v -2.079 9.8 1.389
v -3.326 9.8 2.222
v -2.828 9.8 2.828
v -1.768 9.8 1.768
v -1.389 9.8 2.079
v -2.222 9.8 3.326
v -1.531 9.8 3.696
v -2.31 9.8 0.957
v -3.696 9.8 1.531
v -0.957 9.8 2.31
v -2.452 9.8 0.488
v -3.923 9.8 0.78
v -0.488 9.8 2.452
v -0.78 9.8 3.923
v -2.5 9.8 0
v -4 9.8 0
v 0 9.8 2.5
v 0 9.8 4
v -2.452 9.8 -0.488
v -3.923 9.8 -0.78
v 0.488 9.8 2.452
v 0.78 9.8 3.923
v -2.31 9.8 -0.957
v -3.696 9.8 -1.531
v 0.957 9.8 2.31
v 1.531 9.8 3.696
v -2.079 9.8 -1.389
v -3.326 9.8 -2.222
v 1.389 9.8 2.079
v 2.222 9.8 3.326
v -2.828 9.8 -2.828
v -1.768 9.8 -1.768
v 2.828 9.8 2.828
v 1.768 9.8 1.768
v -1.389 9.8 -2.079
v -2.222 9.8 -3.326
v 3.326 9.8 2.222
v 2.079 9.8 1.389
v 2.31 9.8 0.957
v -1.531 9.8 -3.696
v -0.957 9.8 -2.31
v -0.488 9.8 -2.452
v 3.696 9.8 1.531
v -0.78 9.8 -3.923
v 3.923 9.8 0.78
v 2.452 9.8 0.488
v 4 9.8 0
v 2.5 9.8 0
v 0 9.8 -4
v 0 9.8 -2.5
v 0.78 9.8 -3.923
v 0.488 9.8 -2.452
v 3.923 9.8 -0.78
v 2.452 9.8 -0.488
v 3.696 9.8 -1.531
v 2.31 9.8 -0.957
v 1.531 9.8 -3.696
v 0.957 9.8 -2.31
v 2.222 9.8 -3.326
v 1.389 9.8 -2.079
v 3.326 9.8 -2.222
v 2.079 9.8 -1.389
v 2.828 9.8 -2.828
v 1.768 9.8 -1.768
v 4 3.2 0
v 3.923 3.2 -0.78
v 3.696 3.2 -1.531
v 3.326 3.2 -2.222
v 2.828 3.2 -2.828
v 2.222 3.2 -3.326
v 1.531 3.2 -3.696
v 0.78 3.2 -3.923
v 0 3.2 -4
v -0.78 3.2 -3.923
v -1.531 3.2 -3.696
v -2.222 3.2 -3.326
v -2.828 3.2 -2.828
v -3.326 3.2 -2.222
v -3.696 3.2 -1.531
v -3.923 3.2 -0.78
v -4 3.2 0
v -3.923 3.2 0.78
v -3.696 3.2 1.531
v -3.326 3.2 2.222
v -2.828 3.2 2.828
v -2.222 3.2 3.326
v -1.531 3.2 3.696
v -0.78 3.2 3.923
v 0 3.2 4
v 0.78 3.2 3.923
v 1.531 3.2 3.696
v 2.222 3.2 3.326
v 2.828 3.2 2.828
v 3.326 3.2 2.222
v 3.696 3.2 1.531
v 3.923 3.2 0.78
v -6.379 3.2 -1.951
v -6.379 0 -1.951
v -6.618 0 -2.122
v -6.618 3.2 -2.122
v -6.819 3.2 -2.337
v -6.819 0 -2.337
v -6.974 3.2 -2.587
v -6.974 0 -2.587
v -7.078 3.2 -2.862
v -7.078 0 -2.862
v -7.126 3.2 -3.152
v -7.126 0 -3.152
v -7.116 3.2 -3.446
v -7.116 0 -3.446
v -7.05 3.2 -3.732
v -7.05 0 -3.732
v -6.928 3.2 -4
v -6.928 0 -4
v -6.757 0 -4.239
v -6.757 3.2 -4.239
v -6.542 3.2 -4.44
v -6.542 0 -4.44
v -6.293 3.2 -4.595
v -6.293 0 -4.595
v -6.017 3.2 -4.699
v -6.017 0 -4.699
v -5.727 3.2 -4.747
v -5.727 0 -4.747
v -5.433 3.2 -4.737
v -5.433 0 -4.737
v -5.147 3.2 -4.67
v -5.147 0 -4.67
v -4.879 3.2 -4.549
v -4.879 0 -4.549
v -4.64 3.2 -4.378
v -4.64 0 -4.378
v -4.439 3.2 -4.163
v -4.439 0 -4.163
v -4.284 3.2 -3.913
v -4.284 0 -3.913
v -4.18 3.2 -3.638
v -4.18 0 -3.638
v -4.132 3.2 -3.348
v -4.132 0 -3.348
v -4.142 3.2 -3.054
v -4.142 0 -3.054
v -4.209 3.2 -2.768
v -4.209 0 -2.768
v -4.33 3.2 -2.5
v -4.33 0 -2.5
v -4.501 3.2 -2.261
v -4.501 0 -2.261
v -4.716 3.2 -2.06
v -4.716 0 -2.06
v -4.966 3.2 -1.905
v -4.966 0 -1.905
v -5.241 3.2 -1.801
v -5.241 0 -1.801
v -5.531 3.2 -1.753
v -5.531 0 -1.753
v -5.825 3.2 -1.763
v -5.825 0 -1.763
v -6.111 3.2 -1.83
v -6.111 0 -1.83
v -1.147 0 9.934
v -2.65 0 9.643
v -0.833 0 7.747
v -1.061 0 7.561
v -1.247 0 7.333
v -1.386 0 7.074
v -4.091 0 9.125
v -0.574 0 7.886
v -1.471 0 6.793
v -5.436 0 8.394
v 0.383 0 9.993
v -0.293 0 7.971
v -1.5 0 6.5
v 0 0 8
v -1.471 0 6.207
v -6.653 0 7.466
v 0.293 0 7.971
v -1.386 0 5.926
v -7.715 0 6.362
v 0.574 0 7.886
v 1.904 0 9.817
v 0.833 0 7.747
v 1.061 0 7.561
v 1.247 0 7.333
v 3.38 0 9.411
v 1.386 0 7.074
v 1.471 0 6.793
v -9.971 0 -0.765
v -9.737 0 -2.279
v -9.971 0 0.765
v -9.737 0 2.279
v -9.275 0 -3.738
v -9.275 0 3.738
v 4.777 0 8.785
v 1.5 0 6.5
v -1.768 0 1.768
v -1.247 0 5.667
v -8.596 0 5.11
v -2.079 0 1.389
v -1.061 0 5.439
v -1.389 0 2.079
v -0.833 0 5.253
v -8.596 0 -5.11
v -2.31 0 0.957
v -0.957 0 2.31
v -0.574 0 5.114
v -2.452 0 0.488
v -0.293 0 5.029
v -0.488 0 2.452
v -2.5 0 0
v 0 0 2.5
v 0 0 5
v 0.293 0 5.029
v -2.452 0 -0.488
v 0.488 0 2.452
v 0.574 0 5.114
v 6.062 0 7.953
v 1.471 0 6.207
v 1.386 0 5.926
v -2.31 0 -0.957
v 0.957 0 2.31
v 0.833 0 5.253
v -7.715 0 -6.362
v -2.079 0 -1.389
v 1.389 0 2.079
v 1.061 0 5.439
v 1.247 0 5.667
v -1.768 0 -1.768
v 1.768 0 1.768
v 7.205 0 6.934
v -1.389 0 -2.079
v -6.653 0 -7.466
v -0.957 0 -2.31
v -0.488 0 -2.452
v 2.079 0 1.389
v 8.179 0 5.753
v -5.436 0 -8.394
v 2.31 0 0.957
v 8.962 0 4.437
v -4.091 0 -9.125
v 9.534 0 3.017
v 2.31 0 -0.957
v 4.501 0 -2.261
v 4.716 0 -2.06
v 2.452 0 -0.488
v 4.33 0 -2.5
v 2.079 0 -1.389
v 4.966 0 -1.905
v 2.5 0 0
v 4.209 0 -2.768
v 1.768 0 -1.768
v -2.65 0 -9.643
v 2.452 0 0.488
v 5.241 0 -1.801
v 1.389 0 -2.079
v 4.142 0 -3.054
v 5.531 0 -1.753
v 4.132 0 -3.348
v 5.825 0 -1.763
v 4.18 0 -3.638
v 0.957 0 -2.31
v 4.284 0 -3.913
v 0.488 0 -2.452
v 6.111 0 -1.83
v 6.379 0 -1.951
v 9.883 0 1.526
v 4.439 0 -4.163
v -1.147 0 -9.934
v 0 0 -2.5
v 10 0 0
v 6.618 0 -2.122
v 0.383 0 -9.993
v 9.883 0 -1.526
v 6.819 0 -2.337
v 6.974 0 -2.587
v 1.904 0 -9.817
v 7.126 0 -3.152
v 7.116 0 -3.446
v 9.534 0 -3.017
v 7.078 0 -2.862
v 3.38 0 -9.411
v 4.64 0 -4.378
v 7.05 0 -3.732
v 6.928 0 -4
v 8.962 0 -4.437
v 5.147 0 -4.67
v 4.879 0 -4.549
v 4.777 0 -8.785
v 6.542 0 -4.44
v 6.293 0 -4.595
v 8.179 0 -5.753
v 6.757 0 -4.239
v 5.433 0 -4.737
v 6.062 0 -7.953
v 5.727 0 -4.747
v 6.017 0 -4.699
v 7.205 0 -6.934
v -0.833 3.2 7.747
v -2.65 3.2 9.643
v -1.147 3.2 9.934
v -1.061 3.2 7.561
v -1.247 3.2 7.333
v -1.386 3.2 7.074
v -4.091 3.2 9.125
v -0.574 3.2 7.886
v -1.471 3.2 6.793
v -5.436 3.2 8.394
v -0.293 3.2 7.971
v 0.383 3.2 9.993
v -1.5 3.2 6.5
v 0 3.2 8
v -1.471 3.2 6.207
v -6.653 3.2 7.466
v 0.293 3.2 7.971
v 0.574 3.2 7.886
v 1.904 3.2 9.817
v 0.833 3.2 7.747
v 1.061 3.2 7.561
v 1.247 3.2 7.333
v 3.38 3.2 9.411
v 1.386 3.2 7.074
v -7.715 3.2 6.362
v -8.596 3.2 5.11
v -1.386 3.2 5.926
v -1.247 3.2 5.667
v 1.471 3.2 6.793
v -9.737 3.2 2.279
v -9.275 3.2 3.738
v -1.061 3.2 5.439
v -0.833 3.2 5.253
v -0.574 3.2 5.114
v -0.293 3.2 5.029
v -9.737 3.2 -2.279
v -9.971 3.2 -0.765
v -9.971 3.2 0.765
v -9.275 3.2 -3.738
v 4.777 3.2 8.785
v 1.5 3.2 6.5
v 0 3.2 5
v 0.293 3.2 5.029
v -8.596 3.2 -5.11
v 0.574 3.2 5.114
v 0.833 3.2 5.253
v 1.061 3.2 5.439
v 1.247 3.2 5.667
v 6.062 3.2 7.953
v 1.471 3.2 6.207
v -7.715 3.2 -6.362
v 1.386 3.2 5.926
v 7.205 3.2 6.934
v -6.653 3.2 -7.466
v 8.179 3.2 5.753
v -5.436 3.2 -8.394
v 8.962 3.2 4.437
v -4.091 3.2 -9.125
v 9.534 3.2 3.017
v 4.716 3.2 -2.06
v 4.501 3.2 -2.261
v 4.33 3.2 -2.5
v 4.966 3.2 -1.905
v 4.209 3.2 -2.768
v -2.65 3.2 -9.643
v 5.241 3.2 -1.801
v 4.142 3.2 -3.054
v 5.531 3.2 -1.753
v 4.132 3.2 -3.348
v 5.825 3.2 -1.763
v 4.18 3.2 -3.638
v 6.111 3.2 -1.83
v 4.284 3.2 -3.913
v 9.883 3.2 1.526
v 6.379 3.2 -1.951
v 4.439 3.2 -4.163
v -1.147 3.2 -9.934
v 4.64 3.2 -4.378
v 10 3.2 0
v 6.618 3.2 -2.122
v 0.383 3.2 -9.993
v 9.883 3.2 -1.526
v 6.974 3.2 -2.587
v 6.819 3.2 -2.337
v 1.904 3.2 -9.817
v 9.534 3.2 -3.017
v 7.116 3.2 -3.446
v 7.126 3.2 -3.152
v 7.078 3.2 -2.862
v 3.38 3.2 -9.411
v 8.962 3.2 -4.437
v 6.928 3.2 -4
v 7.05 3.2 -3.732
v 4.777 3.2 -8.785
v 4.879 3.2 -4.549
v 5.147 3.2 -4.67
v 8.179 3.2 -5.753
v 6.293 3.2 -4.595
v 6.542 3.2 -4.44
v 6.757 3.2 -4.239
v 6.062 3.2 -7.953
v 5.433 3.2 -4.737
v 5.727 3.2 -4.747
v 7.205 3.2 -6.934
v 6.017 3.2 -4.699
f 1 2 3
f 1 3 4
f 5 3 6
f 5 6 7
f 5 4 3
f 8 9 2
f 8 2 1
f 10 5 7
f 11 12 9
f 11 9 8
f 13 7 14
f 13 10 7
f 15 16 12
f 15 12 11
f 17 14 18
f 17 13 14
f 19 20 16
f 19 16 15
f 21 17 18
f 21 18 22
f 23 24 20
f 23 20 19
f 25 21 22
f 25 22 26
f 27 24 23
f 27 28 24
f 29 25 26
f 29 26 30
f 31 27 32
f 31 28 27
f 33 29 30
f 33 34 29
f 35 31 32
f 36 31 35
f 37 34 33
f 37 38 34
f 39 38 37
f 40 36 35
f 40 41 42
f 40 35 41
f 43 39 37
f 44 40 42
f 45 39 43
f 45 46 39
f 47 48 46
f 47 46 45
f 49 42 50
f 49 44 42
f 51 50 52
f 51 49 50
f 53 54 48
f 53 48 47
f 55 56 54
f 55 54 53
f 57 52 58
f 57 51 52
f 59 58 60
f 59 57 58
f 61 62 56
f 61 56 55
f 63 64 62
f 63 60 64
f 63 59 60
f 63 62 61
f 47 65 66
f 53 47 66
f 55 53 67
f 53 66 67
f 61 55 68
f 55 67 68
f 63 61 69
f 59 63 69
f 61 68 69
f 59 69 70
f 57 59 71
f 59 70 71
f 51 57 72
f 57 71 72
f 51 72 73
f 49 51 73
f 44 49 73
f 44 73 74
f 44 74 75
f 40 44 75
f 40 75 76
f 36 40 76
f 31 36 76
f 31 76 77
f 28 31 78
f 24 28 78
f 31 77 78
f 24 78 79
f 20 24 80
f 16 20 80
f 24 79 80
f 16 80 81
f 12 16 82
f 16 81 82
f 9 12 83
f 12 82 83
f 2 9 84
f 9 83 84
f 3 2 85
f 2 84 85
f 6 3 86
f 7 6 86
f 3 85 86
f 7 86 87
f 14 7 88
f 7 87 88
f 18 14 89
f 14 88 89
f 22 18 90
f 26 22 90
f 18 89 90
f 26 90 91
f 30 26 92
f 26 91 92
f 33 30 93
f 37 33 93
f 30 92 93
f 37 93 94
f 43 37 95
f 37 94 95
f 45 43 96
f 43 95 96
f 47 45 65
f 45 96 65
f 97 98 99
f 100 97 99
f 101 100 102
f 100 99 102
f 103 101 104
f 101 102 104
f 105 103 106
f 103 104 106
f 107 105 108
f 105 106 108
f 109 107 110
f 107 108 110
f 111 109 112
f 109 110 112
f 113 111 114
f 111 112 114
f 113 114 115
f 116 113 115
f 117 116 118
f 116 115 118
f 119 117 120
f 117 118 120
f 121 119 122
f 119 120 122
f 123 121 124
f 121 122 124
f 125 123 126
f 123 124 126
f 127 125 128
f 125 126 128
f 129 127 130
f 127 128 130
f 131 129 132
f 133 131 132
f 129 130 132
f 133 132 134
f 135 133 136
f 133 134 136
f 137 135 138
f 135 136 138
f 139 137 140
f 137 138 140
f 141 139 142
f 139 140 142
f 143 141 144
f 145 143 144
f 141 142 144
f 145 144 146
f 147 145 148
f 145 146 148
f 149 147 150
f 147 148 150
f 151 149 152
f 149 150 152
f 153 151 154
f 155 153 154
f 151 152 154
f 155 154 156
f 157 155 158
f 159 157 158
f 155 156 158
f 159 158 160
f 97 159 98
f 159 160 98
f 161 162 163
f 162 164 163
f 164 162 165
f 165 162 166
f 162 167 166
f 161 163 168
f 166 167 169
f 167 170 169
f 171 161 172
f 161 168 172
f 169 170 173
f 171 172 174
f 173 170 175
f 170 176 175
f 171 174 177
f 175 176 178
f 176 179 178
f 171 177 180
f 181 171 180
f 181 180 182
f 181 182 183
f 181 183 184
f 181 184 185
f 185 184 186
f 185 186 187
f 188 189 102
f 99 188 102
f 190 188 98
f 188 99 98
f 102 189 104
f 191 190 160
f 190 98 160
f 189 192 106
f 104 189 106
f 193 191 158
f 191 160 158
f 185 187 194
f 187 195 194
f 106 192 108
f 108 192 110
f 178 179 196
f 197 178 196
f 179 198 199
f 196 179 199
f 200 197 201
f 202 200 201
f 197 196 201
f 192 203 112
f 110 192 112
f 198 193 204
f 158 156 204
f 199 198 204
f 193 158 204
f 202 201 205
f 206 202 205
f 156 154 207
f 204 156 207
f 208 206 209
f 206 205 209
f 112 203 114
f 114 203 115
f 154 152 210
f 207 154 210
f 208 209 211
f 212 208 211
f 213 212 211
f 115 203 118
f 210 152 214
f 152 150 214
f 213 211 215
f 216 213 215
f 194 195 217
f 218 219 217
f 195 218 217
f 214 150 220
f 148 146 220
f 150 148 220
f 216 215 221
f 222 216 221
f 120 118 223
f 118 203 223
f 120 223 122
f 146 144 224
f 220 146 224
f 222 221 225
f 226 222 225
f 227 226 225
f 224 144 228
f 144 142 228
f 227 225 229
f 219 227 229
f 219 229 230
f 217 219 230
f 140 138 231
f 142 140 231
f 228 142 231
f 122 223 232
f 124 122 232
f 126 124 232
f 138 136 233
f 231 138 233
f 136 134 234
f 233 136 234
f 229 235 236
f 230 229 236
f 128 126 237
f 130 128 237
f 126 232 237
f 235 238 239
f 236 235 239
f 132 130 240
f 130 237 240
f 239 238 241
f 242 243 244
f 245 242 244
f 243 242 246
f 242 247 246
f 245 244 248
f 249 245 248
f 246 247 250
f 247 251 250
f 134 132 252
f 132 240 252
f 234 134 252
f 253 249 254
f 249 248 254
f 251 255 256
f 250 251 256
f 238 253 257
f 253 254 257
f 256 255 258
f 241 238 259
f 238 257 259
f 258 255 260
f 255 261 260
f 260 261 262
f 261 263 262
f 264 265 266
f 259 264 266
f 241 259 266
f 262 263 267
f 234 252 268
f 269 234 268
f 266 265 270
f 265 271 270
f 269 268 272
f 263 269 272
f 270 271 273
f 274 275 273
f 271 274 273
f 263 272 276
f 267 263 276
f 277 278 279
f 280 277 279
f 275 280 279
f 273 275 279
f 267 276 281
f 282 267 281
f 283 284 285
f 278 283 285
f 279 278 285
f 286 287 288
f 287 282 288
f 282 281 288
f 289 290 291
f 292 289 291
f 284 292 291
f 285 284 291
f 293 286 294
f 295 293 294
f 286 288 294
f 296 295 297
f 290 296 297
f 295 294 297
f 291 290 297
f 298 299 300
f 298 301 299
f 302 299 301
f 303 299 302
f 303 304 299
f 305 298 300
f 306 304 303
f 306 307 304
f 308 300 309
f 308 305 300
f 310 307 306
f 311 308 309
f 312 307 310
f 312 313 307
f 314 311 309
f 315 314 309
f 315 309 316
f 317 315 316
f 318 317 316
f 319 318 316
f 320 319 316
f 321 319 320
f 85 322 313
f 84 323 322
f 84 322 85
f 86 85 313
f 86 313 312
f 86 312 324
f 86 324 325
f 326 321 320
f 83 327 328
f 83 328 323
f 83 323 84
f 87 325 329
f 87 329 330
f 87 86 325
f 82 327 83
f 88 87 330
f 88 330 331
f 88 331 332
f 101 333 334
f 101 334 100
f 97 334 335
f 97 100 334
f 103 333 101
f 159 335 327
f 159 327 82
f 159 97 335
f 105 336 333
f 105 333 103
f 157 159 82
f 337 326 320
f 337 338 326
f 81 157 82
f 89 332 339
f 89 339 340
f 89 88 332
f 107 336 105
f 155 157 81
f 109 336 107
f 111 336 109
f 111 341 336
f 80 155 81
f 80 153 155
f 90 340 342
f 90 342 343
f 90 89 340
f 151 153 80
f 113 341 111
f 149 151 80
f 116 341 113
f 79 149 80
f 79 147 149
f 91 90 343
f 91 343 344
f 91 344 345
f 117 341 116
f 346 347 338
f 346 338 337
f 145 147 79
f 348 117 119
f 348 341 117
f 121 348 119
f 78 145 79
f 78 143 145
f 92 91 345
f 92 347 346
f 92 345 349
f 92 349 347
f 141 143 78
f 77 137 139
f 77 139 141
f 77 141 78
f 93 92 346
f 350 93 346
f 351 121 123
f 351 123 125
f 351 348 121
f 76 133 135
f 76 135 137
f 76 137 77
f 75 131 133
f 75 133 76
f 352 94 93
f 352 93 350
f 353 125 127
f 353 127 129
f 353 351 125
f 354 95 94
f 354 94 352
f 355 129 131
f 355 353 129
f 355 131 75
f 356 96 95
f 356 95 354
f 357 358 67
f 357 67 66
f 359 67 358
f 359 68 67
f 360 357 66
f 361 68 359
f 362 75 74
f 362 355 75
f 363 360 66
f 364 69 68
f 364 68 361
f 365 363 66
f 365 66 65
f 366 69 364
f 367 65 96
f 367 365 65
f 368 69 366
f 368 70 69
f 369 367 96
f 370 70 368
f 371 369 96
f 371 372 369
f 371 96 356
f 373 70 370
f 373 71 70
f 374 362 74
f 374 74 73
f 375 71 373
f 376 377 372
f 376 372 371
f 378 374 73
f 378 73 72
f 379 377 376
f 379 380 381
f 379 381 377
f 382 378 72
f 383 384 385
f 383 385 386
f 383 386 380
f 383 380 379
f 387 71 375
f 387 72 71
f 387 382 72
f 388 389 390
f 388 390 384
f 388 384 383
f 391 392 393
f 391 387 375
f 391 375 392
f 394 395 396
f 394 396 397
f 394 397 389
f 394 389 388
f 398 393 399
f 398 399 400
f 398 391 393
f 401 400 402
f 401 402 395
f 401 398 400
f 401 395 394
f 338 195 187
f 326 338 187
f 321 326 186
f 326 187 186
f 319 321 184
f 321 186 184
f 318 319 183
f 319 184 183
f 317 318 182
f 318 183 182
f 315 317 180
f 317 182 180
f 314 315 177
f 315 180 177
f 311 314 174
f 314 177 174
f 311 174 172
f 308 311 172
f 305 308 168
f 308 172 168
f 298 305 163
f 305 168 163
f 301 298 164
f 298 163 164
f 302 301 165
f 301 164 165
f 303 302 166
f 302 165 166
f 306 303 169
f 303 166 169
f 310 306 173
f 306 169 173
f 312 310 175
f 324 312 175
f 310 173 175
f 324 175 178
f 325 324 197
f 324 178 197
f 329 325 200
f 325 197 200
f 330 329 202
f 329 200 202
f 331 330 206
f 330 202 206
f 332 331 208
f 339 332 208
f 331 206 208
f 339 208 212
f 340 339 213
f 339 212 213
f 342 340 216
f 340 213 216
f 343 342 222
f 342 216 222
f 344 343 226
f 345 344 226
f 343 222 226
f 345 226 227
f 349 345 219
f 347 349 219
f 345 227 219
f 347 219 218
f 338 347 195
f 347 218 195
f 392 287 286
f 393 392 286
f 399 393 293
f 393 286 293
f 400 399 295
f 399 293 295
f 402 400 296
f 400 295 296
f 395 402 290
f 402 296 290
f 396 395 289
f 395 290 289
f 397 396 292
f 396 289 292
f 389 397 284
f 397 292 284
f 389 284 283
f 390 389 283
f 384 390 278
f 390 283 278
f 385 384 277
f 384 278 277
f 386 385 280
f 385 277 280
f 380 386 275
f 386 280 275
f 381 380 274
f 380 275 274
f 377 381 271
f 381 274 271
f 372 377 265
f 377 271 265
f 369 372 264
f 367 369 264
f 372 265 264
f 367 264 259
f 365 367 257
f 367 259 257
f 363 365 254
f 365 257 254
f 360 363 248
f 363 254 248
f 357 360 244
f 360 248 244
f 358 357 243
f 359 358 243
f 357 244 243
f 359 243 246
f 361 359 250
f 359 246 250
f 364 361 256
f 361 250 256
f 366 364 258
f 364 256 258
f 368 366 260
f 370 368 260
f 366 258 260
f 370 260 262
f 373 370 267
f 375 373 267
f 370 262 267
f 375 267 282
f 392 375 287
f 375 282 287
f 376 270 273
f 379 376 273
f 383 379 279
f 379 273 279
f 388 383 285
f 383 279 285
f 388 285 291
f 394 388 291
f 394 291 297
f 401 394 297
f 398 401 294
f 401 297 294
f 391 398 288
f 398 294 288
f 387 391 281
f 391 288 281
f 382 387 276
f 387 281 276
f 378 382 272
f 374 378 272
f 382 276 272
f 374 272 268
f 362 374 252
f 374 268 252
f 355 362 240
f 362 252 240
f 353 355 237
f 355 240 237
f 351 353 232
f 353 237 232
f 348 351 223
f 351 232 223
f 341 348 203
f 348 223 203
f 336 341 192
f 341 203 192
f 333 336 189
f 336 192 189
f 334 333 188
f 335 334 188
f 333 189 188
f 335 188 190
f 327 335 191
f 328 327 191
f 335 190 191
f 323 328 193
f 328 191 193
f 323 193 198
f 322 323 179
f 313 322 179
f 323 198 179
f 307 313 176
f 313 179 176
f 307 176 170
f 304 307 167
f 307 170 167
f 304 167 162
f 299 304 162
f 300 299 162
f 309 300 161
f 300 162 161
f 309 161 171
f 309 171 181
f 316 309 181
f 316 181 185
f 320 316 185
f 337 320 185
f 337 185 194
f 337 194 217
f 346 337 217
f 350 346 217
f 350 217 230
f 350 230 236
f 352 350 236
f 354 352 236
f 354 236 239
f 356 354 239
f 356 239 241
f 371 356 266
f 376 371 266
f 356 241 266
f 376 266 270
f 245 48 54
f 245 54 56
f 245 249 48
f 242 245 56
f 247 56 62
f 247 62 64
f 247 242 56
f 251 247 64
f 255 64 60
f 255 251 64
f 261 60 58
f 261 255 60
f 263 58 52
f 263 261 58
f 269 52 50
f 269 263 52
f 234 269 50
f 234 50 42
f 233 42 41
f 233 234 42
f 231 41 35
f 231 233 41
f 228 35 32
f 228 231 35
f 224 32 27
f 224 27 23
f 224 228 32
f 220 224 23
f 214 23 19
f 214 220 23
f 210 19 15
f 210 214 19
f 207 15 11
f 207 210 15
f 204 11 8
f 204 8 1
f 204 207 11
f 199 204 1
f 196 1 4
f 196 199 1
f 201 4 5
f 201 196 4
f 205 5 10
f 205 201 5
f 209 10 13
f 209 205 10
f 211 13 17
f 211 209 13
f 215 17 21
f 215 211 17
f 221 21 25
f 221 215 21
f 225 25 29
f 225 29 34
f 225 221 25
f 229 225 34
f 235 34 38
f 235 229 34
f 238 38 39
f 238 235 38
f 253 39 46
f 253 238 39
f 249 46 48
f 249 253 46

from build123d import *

# Parameters (mm, degrees)
ESBO_O1_R                = 10
ESBO_O1_R_2              = 2.5
RESSALTO_EXTRUS_O1_DEPTH = 3.2
ESBO_O2_R                = 1.5
CORTE_EXTRUS_O1_DEPTH    = 3.2
PADR_OCIRCULAR1_COUNT    = 3
ESBO_O3_R                = 4
ESBO_O3_R_2              = 2.5
RESSALTO_EXTRUS_O2_DEPTH = 6.6


with BuildPart() as part:
    # Esboço1 → Ressalto-extrusão1 (new body)
    with BuildSketch(Plane(origin=(0, 0, 0), x_dir=(1, 0, 0), z_dir=(0, 1, 0))):
        Circle(ESBO_O1_R)
        Circle(ESBO_O1_R_2, mode=Mode.SUBTRACT)
    extrude(amount=RESSALTO_EXTRUS_O1_DEPTH)

    # Esboço2 → Corte-extrusão1 (cut)
    with BuildSketch(Plane.XZ):
        with Locations((0, 6.5)):
            Circle(ESBO_O2_R)
    corte_extrus_o1 = extrude(amount=-CORTE_EXTRUS_O1_DEPTH, mode=Mode.SUBTRACT)

    # PadrãoCircular1: Corte-extrusão1 ×3 about axis
    padr_ocircular1_axis = Axis((0, 0, 0), (0, 1, 0))
    for i in range(1, PADR_OCIRCULAR1_COUNT):
        add(corte_extrus_o1.rotate(padr_ocircular1_axis, i * 360 / PADR_OCIRCULAR1_COUNT), mode=Mode.SUBTRACT)

    # Esboço3 → Ressalto-extrusão2 (add)
    with BuildSketch(Plane(origin=(0, 3.2, 0), x_dir=(1, 0, 0), z_dir=(0, 1, 0))):
        Circle(ESBO_O3_R)
        Circle(ESBO_O3_R_2, mode=Mode.SUBTRACT)
    extrude(amount=RESSALTO_EXTRUS_O2_DEPTH)


solid = part.part
